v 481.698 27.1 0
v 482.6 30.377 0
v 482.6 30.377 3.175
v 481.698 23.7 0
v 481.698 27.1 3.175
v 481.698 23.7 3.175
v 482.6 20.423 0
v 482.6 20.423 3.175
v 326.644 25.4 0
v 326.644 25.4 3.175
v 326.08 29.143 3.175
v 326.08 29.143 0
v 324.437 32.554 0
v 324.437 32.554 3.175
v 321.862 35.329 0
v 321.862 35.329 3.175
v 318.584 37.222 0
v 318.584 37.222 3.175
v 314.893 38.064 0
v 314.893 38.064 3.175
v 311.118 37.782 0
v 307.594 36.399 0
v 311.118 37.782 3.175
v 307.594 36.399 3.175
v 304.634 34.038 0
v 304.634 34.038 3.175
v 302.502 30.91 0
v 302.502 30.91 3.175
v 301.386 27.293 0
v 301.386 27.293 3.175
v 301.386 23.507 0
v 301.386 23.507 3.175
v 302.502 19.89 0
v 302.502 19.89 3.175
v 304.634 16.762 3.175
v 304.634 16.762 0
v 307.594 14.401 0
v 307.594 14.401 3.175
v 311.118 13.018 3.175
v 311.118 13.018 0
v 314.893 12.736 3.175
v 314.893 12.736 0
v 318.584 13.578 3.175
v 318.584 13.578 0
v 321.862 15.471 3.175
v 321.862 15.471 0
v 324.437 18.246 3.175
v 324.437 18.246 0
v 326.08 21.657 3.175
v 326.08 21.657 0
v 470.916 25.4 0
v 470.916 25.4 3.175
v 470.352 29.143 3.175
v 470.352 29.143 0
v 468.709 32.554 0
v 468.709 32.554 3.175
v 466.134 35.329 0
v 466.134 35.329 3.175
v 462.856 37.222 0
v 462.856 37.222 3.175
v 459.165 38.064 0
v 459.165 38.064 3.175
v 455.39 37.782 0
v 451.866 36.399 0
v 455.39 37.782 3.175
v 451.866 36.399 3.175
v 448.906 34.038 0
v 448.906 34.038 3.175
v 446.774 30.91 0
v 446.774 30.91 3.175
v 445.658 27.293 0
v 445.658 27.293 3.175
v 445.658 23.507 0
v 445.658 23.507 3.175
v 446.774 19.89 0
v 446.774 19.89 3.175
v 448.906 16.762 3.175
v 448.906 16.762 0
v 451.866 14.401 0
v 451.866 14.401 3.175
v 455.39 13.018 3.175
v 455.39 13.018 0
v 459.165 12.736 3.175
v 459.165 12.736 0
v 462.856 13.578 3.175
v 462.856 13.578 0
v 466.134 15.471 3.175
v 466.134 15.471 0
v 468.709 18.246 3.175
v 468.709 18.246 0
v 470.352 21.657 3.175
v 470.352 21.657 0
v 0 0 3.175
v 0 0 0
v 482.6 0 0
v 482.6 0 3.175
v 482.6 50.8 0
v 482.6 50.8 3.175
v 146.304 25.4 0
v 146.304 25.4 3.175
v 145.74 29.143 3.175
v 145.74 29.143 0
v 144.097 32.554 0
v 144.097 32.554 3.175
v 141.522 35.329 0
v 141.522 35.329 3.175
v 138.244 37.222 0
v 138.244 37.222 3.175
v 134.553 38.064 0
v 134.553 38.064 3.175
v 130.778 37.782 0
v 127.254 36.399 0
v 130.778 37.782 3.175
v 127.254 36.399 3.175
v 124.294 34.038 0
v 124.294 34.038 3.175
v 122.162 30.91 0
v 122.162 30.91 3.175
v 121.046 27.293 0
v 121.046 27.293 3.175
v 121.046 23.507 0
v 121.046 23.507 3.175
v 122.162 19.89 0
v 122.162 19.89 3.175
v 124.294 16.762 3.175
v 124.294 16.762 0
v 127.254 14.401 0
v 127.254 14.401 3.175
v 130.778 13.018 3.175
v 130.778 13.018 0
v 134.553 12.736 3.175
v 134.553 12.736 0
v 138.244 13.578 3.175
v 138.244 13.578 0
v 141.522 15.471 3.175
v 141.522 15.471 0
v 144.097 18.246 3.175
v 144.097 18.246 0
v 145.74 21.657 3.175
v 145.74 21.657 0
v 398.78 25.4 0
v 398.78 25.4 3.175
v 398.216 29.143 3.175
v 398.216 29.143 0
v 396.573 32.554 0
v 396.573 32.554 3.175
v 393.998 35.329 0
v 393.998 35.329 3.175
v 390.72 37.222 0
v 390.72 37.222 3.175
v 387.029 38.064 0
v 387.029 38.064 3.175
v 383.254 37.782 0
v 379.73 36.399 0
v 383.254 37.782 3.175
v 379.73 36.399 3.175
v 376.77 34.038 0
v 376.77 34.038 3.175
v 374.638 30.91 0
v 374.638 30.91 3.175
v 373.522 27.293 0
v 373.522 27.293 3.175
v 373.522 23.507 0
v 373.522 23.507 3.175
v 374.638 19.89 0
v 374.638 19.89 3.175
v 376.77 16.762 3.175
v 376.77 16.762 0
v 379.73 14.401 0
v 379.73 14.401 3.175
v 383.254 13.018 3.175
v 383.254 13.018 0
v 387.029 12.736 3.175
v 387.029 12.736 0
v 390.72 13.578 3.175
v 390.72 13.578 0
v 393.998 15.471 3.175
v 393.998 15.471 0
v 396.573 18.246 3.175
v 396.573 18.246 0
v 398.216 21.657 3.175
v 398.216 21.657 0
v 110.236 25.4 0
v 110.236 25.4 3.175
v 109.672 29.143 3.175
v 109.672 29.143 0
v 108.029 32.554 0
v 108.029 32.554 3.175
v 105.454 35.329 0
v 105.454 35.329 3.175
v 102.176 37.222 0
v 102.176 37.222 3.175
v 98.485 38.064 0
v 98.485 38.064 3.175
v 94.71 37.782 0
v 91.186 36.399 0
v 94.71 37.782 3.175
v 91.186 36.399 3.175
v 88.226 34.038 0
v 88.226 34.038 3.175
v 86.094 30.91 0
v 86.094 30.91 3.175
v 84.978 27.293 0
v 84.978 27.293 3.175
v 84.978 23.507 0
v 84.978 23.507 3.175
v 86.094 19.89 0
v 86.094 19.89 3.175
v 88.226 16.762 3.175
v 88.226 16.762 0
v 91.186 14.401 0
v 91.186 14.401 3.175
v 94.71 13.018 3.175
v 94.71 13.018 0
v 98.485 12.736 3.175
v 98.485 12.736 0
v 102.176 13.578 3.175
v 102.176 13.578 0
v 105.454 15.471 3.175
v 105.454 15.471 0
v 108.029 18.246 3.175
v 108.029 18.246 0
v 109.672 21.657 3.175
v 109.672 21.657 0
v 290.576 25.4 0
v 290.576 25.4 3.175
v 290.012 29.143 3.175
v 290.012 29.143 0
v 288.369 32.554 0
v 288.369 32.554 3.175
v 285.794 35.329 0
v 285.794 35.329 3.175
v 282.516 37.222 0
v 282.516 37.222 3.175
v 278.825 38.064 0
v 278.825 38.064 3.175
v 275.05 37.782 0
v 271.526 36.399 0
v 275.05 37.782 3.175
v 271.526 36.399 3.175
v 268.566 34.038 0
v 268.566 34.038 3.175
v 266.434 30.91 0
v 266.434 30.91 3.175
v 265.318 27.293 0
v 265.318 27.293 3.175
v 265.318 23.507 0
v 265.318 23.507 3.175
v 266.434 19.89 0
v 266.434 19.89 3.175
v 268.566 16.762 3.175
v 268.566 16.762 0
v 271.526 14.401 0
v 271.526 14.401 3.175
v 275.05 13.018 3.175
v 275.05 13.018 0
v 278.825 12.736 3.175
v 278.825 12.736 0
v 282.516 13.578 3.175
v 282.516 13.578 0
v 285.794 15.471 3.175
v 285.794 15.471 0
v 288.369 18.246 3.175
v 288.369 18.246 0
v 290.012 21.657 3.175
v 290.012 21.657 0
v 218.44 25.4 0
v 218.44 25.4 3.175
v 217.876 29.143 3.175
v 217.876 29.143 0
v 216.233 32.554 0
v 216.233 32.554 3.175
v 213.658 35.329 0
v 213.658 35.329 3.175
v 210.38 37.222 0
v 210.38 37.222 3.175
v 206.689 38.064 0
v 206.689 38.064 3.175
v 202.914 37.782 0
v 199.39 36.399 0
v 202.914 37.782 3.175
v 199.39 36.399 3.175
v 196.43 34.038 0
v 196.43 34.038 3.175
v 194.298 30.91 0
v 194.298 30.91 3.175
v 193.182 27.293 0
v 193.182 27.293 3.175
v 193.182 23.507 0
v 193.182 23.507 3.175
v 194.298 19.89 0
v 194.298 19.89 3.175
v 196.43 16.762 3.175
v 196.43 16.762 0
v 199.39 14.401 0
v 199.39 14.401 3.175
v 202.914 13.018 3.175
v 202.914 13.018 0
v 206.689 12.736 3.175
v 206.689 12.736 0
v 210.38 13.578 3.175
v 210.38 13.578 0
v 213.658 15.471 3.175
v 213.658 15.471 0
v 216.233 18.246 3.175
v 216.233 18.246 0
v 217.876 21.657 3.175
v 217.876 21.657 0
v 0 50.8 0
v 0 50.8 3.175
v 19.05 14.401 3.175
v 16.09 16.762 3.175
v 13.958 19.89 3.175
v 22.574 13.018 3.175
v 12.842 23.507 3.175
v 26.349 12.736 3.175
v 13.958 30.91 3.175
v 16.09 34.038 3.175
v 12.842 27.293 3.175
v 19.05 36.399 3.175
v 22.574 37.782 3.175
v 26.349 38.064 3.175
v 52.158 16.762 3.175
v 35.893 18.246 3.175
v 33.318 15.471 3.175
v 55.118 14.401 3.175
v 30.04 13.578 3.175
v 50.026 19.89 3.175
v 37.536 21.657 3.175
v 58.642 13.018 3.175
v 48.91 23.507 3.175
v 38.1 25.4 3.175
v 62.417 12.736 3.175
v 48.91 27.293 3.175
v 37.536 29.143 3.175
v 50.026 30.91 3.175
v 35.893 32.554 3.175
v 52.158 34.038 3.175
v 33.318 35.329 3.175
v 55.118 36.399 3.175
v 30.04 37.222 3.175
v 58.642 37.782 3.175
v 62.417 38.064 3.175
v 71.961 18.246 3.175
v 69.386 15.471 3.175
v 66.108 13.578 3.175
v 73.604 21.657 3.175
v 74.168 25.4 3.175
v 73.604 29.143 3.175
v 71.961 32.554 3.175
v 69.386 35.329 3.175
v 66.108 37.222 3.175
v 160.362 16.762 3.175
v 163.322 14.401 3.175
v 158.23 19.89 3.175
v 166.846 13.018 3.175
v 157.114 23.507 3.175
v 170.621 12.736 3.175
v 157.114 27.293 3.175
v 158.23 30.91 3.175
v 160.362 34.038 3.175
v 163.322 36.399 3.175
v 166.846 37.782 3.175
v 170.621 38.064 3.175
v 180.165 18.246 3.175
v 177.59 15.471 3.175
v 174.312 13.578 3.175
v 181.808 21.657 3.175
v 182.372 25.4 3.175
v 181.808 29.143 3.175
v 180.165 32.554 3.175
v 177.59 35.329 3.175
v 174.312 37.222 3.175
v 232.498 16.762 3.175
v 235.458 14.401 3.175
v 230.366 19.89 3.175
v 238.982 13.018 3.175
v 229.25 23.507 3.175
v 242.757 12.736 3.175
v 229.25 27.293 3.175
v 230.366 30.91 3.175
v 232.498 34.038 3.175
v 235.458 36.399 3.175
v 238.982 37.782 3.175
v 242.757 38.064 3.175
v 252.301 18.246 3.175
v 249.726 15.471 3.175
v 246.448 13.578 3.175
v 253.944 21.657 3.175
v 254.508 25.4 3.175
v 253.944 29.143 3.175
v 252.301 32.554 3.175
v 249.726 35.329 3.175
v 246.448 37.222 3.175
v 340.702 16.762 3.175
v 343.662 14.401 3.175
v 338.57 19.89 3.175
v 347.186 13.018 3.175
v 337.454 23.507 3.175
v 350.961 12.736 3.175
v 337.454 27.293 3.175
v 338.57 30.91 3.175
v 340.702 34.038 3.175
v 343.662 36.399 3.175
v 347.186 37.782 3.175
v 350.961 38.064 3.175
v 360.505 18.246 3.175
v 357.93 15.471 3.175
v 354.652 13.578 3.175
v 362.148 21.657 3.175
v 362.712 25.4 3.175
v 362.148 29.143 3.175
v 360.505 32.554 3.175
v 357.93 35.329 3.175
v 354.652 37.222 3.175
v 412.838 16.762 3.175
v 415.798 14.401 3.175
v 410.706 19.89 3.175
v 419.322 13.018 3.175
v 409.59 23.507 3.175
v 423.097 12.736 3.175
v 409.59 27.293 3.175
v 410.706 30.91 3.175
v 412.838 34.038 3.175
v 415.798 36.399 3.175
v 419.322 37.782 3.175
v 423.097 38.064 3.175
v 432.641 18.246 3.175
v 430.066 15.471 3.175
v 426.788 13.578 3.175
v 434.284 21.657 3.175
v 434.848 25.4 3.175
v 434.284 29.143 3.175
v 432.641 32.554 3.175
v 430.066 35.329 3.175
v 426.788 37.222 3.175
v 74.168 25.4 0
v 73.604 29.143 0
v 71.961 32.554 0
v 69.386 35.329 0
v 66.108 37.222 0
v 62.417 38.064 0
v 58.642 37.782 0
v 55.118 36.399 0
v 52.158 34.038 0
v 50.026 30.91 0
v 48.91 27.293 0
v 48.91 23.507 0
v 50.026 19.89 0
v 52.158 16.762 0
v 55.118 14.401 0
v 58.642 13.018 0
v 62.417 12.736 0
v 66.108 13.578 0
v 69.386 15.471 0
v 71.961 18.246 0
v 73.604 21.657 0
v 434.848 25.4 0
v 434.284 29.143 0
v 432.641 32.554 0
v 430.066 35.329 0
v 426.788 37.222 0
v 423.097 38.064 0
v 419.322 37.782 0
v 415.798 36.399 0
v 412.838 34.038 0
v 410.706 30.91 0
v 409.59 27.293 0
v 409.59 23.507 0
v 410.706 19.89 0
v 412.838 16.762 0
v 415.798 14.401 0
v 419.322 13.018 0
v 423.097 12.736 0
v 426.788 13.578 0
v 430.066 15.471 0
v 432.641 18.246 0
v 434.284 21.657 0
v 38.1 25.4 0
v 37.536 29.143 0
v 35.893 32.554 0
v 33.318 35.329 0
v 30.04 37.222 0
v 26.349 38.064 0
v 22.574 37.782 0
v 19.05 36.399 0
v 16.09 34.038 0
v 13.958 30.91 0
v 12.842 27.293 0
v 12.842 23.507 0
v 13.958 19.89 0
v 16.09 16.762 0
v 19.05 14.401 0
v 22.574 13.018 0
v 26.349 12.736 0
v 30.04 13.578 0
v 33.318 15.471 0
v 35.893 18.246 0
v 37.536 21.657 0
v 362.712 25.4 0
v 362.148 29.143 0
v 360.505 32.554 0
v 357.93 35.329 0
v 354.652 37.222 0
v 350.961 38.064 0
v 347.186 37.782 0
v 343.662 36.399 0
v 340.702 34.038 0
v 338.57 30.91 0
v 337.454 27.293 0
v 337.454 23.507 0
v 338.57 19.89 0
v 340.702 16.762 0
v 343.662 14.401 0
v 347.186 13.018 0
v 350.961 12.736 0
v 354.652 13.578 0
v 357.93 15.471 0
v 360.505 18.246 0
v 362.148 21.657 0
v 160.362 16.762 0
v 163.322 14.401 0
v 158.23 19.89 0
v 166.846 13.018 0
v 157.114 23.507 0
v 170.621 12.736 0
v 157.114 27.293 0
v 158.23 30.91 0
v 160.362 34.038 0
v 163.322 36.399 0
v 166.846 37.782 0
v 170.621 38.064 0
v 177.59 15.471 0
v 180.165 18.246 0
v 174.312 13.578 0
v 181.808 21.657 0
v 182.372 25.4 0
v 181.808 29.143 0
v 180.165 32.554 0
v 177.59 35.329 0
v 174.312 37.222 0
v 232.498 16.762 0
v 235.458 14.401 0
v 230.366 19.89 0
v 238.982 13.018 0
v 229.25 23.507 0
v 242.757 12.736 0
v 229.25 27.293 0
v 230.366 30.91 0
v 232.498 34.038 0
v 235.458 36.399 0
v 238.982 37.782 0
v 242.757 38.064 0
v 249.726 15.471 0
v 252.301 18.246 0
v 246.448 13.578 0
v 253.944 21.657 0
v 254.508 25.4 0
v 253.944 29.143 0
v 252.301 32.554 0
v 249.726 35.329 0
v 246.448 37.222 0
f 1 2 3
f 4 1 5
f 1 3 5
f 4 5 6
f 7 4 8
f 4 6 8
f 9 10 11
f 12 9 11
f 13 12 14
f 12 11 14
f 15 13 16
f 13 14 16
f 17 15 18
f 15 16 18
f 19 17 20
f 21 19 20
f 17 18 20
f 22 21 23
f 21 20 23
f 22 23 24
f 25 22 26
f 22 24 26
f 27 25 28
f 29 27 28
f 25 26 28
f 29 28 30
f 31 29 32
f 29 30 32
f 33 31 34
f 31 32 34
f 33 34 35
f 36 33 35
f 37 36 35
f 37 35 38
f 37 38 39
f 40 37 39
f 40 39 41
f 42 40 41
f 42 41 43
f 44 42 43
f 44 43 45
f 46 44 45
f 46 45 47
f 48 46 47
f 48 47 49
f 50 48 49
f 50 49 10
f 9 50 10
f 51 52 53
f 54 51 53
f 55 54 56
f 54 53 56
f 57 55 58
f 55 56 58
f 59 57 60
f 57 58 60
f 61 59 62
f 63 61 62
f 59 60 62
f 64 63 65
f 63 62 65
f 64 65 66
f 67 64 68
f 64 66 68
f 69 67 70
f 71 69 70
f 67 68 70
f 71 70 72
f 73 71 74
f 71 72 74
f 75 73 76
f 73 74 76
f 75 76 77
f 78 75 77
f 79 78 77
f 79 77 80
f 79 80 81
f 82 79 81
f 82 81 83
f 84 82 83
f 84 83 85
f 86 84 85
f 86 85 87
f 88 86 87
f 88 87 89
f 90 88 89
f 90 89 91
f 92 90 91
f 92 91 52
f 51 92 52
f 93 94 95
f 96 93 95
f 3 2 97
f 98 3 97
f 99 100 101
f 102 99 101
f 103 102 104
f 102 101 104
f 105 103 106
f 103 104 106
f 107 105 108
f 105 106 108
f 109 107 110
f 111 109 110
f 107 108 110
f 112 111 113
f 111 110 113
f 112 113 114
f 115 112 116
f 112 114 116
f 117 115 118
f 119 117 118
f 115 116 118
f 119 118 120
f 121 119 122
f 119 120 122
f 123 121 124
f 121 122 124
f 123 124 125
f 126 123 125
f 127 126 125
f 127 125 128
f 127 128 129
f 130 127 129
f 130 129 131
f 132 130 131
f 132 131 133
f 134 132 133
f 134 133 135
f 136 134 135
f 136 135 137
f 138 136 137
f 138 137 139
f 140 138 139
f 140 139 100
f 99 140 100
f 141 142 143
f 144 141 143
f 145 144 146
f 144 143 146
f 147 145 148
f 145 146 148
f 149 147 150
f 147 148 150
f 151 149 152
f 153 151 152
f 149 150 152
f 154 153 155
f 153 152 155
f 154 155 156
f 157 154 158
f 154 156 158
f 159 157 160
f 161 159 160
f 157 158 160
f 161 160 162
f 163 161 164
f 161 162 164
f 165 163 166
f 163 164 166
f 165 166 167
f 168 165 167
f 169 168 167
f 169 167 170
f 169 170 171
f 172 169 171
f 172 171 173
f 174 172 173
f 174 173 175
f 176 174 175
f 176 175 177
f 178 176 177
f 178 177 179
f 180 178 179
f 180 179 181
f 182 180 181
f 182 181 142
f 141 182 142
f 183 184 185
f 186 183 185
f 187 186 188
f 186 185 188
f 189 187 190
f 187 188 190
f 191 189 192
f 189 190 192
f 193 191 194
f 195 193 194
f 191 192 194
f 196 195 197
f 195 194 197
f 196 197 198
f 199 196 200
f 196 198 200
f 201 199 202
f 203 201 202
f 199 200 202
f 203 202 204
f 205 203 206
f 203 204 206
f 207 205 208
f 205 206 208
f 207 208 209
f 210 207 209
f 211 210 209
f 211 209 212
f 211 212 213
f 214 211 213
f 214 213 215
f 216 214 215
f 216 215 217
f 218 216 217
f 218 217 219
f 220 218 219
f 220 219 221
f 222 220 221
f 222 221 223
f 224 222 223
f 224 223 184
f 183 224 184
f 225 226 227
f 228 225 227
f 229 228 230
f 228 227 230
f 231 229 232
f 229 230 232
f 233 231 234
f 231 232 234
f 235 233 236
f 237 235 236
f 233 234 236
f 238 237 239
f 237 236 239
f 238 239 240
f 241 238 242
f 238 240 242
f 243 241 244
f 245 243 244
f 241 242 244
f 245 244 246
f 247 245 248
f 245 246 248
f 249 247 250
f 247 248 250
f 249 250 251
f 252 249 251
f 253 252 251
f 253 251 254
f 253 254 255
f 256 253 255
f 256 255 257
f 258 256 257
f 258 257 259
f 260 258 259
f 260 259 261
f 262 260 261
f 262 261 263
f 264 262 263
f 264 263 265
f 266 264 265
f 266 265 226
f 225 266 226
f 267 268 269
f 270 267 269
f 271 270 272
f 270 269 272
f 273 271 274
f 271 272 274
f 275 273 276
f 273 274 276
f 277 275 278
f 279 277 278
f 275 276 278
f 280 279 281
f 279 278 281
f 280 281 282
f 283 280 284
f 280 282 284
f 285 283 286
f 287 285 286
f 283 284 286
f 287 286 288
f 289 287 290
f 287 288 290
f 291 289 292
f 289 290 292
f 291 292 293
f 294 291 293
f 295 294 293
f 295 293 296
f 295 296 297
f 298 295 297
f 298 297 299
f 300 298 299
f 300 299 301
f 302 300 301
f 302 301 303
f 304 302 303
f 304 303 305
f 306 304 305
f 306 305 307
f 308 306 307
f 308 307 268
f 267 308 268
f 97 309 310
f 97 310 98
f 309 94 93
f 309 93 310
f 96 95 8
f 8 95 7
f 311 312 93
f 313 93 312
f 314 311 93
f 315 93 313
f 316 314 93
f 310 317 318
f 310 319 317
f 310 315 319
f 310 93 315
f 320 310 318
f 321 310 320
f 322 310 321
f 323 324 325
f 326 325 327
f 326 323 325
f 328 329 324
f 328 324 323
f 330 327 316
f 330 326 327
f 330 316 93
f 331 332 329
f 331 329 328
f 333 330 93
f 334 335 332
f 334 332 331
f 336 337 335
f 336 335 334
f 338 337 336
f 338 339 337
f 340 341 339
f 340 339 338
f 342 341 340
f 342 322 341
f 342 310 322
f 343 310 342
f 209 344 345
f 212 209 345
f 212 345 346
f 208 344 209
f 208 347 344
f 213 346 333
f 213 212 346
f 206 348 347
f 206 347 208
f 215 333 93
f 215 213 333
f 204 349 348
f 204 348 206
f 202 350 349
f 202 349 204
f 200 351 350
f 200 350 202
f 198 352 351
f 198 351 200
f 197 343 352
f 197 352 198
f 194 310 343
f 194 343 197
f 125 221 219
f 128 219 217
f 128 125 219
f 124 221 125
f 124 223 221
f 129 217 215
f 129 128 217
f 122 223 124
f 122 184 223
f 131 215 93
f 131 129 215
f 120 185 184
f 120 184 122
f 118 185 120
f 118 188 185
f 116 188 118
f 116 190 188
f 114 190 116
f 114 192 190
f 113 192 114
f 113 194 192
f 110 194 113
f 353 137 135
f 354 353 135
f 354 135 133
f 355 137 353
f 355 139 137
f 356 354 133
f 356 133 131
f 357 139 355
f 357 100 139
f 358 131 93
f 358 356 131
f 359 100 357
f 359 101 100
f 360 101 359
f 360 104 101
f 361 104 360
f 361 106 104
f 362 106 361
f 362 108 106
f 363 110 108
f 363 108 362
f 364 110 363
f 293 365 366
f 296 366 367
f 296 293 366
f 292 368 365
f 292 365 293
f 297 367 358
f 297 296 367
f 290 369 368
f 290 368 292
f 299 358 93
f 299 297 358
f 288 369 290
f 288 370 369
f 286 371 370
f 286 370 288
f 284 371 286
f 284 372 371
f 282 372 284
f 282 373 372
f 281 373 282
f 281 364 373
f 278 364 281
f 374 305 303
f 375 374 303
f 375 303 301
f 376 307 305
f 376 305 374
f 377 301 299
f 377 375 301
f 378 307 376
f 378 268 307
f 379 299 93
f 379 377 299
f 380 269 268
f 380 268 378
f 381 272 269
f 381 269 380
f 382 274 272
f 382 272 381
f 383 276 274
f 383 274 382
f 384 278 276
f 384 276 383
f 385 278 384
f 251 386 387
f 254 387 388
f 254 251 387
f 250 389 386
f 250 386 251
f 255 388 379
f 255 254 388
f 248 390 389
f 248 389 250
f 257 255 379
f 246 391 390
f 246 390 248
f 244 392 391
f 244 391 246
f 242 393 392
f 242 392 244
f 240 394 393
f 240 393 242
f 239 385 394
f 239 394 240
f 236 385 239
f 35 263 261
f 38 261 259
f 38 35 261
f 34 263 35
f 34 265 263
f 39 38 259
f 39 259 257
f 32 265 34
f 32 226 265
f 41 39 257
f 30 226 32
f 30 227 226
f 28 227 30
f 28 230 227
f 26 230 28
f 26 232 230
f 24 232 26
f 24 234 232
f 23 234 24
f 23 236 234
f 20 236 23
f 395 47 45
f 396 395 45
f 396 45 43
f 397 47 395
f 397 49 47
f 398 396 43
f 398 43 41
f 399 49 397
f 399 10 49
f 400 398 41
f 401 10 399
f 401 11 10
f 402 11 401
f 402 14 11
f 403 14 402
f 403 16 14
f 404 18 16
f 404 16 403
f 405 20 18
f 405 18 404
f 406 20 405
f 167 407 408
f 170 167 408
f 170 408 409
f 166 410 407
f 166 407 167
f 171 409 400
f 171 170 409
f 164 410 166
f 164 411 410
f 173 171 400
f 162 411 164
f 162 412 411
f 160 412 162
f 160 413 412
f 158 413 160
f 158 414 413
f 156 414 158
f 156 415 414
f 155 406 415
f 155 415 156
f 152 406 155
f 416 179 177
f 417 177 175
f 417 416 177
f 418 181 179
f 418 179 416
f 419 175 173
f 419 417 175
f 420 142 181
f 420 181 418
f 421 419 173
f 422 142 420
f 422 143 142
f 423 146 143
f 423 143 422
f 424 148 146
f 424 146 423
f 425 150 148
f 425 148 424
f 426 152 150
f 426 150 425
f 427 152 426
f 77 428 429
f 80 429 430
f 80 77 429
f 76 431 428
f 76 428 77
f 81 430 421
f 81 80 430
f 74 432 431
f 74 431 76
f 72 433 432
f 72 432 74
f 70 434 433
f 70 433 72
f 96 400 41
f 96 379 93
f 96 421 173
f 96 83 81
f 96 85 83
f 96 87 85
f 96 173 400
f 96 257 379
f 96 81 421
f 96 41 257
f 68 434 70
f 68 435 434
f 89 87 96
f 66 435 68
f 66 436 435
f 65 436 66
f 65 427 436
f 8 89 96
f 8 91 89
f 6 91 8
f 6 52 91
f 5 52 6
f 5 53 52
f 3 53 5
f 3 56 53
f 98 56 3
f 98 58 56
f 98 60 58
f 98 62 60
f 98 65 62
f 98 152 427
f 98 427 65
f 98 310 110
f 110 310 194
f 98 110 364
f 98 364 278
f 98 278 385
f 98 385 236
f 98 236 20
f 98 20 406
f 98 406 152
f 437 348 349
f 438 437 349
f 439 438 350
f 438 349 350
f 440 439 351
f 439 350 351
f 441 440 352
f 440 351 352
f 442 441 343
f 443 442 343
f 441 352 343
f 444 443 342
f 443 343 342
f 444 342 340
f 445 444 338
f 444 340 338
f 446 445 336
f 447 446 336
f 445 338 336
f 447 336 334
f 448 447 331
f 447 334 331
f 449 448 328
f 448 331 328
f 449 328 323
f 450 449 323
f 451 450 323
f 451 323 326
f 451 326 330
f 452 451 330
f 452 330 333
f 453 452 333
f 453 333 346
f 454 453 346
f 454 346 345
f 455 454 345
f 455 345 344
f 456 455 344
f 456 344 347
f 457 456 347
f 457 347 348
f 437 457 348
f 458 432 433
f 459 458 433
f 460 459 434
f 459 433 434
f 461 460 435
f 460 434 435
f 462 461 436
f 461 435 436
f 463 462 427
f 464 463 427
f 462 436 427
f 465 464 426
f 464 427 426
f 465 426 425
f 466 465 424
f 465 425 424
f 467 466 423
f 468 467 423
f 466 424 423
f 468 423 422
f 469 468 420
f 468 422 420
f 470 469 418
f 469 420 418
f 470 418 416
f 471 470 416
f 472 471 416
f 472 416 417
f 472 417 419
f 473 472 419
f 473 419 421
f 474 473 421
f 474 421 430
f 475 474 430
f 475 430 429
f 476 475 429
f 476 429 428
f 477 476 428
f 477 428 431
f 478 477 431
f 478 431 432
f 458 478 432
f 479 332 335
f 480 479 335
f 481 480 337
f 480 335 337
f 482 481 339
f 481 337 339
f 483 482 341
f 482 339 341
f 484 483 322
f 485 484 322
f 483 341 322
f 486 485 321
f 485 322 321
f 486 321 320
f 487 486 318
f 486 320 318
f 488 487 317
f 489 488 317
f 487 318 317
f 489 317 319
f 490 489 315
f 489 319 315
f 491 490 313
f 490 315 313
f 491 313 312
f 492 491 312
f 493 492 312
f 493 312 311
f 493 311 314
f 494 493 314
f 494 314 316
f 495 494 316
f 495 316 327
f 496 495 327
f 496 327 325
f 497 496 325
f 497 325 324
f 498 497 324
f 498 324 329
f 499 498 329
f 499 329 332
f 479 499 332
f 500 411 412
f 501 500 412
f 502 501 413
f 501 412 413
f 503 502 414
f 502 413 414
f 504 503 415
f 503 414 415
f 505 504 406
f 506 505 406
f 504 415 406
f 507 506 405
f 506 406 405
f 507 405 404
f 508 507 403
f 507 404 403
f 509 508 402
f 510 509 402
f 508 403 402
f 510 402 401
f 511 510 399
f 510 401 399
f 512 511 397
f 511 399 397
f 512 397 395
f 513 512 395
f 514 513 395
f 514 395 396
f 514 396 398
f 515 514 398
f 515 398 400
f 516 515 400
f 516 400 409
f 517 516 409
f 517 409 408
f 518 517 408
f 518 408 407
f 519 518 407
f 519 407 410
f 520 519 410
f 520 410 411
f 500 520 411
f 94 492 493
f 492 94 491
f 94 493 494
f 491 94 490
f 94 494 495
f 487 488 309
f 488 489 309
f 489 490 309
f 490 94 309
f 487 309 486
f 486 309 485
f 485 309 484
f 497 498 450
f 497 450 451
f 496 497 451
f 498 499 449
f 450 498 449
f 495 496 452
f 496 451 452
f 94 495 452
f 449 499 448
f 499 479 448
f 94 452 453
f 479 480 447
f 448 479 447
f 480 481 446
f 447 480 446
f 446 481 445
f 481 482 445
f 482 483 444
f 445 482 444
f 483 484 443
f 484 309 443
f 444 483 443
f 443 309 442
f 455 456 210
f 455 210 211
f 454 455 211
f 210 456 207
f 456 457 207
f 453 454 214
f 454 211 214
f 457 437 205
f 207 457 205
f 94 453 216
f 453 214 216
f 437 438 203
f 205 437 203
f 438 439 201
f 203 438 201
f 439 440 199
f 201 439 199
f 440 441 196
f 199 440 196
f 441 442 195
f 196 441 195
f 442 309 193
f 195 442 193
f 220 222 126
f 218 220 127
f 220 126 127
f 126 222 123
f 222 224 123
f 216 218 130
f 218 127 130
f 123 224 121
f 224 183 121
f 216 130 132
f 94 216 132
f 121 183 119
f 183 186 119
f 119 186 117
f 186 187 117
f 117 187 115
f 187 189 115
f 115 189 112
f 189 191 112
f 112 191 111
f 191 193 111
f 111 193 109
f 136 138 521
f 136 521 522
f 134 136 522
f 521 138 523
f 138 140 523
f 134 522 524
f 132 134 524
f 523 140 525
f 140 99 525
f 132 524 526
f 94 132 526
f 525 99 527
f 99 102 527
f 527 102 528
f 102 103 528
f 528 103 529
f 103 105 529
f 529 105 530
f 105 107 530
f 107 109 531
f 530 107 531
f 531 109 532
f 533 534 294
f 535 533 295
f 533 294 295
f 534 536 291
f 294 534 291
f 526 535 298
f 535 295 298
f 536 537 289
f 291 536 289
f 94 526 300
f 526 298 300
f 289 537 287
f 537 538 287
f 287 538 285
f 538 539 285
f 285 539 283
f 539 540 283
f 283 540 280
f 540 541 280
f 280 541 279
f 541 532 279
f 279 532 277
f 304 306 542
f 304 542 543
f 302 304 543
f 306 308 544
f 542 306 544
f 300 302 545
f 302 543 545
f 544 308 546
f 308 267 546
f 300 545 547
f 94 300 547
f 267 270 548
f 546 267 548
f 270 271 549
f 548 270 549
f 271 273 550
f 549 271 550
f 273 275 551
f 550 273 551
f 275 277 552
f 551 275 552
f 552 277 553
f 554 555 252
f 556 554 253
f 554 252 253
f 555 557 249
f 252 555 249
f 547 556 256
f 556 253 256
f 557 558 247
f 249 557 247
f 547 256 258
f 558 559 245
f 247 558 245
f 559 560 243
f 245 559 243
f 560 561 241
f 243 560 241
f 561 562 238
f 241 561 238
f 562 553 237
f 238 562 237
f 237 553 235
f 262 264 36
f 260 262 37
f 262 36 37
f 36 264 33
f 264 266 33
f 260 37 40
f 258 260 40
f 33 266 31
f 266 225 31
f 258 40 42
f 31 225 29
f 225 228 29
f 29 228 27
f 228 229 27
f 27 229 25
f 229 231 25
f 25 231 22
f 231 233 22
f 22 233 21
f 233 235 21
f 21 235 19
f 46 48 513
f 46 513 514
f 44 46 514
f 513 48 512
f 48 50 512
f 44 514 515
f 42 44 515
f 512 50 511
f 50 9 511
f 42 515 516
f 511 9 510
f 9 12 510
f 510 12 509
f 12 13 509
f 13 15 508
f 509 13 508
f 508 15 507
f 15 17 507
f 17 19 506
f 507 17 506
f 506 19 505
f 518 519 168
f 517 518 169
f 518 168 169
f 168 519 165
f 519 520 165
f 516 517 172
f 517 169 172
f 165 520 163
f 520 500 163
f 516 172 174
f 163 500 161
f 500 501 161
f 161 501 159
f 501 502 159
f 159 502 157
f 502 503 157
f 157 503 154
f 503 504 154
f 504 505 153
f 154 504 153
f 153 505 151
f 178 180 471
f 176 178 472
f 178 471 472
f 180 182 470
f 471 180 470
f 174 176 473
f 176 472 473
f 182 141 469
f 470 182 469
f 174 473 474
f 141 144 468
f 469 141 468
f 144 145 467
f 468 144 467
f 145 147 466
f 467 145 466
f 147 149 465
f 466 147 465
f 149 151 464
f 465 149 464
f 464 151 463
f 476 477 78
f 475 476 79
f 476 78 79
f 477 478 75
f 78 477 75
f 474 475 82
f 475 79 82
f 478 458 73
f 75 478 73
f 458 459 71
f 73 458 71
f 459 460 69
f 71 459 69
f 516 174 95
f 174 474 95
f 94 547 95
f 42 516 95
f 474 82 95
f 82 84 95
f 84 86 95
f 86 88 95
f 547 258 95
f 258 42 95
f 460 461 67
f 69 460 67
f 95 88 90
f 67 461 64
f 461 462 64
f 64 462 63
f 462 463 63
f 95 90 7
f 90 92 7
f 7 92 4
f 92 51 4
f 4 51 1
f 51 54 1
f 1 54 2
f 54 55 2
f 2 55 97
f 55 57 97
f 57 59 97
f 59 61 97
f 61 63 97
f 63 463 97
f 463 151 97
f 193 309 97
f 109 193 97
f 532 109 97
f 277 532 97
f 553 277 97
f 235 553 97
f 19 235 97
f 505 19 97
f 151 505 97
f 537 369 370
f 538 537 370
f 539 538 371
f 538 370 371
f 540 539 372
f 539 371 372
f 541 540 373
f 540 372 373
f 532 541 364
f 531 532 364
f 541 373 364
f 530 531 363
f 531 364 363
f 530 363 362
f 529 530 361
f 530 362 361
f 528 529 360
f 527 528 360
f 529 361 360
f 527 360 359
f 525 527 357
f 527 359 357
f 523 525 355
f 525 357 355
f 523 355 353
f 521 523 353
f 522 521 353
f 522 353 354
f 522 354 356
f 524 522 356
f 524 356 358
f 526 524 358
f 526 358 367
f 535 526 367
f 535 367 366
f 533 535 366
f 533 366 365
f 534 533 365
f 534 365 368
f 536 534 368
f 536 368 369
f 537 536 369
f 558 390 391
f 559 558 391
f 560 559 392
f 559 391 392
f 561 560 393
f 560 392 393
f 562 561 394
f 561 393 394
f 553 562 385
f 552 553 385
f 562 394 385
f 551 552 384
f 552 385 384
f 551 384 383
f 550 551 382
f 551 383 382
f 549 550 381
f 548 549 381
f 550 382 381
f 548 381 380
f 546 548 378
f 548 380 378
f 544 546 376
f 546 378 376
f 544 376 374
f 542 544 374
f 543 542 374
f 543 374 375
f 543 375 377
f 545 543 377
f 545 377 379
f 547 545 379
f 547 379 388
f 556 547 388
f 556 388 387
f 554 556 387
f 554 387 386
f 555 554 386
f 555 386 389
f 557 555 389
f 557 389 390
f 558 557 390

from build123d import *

# Parameters (mm, degrees)
SKETCH1_W           = 482.6
SKETCH1_H           = 50.8
BOSS_EXTRUDE1_DEPTH = 3.175
SKETCH2_R           = 12.7
CUT_EXTRUDE1_DEPTH  = 486.276705216
LPATTERN1_COUNT     = 15
LPATTERN1_PITCH     = 36.068


with BuildPart() as part:
    # Sketch1 → Boss-Extrude1 (new body)
    with BuildSketch(Plane.XY):
        with Locations((241.3, 25.4)):
            Rectangle(SKETCH1_W, SKETCH1_H)
    extrude(amount=BOSS_EXTRUDE1_DEPTH)

    # Sketch2 → Cut-Extrude1 (cut, through all)
    with BuildSketch(Plane.XY.offset(3.175)):
        with Locations((25.4, 25.4)):
            Circle(SKETCH2_R)
    cut_extrude1 = extrude(amount=-CUT_EXTRUDE1_DEPTH, mode=Mode.SUBTRACT)

    # LPattern1: Cut-Extrude1 ×15
    with Locations(*[(i * LPATTERN1_PITCH, 0, 0) for i in range(1, LPATTERN1_COUNT)]):
        add(cut_extrude1, mode=Mode.SUBTRACT)


solid = part.part
